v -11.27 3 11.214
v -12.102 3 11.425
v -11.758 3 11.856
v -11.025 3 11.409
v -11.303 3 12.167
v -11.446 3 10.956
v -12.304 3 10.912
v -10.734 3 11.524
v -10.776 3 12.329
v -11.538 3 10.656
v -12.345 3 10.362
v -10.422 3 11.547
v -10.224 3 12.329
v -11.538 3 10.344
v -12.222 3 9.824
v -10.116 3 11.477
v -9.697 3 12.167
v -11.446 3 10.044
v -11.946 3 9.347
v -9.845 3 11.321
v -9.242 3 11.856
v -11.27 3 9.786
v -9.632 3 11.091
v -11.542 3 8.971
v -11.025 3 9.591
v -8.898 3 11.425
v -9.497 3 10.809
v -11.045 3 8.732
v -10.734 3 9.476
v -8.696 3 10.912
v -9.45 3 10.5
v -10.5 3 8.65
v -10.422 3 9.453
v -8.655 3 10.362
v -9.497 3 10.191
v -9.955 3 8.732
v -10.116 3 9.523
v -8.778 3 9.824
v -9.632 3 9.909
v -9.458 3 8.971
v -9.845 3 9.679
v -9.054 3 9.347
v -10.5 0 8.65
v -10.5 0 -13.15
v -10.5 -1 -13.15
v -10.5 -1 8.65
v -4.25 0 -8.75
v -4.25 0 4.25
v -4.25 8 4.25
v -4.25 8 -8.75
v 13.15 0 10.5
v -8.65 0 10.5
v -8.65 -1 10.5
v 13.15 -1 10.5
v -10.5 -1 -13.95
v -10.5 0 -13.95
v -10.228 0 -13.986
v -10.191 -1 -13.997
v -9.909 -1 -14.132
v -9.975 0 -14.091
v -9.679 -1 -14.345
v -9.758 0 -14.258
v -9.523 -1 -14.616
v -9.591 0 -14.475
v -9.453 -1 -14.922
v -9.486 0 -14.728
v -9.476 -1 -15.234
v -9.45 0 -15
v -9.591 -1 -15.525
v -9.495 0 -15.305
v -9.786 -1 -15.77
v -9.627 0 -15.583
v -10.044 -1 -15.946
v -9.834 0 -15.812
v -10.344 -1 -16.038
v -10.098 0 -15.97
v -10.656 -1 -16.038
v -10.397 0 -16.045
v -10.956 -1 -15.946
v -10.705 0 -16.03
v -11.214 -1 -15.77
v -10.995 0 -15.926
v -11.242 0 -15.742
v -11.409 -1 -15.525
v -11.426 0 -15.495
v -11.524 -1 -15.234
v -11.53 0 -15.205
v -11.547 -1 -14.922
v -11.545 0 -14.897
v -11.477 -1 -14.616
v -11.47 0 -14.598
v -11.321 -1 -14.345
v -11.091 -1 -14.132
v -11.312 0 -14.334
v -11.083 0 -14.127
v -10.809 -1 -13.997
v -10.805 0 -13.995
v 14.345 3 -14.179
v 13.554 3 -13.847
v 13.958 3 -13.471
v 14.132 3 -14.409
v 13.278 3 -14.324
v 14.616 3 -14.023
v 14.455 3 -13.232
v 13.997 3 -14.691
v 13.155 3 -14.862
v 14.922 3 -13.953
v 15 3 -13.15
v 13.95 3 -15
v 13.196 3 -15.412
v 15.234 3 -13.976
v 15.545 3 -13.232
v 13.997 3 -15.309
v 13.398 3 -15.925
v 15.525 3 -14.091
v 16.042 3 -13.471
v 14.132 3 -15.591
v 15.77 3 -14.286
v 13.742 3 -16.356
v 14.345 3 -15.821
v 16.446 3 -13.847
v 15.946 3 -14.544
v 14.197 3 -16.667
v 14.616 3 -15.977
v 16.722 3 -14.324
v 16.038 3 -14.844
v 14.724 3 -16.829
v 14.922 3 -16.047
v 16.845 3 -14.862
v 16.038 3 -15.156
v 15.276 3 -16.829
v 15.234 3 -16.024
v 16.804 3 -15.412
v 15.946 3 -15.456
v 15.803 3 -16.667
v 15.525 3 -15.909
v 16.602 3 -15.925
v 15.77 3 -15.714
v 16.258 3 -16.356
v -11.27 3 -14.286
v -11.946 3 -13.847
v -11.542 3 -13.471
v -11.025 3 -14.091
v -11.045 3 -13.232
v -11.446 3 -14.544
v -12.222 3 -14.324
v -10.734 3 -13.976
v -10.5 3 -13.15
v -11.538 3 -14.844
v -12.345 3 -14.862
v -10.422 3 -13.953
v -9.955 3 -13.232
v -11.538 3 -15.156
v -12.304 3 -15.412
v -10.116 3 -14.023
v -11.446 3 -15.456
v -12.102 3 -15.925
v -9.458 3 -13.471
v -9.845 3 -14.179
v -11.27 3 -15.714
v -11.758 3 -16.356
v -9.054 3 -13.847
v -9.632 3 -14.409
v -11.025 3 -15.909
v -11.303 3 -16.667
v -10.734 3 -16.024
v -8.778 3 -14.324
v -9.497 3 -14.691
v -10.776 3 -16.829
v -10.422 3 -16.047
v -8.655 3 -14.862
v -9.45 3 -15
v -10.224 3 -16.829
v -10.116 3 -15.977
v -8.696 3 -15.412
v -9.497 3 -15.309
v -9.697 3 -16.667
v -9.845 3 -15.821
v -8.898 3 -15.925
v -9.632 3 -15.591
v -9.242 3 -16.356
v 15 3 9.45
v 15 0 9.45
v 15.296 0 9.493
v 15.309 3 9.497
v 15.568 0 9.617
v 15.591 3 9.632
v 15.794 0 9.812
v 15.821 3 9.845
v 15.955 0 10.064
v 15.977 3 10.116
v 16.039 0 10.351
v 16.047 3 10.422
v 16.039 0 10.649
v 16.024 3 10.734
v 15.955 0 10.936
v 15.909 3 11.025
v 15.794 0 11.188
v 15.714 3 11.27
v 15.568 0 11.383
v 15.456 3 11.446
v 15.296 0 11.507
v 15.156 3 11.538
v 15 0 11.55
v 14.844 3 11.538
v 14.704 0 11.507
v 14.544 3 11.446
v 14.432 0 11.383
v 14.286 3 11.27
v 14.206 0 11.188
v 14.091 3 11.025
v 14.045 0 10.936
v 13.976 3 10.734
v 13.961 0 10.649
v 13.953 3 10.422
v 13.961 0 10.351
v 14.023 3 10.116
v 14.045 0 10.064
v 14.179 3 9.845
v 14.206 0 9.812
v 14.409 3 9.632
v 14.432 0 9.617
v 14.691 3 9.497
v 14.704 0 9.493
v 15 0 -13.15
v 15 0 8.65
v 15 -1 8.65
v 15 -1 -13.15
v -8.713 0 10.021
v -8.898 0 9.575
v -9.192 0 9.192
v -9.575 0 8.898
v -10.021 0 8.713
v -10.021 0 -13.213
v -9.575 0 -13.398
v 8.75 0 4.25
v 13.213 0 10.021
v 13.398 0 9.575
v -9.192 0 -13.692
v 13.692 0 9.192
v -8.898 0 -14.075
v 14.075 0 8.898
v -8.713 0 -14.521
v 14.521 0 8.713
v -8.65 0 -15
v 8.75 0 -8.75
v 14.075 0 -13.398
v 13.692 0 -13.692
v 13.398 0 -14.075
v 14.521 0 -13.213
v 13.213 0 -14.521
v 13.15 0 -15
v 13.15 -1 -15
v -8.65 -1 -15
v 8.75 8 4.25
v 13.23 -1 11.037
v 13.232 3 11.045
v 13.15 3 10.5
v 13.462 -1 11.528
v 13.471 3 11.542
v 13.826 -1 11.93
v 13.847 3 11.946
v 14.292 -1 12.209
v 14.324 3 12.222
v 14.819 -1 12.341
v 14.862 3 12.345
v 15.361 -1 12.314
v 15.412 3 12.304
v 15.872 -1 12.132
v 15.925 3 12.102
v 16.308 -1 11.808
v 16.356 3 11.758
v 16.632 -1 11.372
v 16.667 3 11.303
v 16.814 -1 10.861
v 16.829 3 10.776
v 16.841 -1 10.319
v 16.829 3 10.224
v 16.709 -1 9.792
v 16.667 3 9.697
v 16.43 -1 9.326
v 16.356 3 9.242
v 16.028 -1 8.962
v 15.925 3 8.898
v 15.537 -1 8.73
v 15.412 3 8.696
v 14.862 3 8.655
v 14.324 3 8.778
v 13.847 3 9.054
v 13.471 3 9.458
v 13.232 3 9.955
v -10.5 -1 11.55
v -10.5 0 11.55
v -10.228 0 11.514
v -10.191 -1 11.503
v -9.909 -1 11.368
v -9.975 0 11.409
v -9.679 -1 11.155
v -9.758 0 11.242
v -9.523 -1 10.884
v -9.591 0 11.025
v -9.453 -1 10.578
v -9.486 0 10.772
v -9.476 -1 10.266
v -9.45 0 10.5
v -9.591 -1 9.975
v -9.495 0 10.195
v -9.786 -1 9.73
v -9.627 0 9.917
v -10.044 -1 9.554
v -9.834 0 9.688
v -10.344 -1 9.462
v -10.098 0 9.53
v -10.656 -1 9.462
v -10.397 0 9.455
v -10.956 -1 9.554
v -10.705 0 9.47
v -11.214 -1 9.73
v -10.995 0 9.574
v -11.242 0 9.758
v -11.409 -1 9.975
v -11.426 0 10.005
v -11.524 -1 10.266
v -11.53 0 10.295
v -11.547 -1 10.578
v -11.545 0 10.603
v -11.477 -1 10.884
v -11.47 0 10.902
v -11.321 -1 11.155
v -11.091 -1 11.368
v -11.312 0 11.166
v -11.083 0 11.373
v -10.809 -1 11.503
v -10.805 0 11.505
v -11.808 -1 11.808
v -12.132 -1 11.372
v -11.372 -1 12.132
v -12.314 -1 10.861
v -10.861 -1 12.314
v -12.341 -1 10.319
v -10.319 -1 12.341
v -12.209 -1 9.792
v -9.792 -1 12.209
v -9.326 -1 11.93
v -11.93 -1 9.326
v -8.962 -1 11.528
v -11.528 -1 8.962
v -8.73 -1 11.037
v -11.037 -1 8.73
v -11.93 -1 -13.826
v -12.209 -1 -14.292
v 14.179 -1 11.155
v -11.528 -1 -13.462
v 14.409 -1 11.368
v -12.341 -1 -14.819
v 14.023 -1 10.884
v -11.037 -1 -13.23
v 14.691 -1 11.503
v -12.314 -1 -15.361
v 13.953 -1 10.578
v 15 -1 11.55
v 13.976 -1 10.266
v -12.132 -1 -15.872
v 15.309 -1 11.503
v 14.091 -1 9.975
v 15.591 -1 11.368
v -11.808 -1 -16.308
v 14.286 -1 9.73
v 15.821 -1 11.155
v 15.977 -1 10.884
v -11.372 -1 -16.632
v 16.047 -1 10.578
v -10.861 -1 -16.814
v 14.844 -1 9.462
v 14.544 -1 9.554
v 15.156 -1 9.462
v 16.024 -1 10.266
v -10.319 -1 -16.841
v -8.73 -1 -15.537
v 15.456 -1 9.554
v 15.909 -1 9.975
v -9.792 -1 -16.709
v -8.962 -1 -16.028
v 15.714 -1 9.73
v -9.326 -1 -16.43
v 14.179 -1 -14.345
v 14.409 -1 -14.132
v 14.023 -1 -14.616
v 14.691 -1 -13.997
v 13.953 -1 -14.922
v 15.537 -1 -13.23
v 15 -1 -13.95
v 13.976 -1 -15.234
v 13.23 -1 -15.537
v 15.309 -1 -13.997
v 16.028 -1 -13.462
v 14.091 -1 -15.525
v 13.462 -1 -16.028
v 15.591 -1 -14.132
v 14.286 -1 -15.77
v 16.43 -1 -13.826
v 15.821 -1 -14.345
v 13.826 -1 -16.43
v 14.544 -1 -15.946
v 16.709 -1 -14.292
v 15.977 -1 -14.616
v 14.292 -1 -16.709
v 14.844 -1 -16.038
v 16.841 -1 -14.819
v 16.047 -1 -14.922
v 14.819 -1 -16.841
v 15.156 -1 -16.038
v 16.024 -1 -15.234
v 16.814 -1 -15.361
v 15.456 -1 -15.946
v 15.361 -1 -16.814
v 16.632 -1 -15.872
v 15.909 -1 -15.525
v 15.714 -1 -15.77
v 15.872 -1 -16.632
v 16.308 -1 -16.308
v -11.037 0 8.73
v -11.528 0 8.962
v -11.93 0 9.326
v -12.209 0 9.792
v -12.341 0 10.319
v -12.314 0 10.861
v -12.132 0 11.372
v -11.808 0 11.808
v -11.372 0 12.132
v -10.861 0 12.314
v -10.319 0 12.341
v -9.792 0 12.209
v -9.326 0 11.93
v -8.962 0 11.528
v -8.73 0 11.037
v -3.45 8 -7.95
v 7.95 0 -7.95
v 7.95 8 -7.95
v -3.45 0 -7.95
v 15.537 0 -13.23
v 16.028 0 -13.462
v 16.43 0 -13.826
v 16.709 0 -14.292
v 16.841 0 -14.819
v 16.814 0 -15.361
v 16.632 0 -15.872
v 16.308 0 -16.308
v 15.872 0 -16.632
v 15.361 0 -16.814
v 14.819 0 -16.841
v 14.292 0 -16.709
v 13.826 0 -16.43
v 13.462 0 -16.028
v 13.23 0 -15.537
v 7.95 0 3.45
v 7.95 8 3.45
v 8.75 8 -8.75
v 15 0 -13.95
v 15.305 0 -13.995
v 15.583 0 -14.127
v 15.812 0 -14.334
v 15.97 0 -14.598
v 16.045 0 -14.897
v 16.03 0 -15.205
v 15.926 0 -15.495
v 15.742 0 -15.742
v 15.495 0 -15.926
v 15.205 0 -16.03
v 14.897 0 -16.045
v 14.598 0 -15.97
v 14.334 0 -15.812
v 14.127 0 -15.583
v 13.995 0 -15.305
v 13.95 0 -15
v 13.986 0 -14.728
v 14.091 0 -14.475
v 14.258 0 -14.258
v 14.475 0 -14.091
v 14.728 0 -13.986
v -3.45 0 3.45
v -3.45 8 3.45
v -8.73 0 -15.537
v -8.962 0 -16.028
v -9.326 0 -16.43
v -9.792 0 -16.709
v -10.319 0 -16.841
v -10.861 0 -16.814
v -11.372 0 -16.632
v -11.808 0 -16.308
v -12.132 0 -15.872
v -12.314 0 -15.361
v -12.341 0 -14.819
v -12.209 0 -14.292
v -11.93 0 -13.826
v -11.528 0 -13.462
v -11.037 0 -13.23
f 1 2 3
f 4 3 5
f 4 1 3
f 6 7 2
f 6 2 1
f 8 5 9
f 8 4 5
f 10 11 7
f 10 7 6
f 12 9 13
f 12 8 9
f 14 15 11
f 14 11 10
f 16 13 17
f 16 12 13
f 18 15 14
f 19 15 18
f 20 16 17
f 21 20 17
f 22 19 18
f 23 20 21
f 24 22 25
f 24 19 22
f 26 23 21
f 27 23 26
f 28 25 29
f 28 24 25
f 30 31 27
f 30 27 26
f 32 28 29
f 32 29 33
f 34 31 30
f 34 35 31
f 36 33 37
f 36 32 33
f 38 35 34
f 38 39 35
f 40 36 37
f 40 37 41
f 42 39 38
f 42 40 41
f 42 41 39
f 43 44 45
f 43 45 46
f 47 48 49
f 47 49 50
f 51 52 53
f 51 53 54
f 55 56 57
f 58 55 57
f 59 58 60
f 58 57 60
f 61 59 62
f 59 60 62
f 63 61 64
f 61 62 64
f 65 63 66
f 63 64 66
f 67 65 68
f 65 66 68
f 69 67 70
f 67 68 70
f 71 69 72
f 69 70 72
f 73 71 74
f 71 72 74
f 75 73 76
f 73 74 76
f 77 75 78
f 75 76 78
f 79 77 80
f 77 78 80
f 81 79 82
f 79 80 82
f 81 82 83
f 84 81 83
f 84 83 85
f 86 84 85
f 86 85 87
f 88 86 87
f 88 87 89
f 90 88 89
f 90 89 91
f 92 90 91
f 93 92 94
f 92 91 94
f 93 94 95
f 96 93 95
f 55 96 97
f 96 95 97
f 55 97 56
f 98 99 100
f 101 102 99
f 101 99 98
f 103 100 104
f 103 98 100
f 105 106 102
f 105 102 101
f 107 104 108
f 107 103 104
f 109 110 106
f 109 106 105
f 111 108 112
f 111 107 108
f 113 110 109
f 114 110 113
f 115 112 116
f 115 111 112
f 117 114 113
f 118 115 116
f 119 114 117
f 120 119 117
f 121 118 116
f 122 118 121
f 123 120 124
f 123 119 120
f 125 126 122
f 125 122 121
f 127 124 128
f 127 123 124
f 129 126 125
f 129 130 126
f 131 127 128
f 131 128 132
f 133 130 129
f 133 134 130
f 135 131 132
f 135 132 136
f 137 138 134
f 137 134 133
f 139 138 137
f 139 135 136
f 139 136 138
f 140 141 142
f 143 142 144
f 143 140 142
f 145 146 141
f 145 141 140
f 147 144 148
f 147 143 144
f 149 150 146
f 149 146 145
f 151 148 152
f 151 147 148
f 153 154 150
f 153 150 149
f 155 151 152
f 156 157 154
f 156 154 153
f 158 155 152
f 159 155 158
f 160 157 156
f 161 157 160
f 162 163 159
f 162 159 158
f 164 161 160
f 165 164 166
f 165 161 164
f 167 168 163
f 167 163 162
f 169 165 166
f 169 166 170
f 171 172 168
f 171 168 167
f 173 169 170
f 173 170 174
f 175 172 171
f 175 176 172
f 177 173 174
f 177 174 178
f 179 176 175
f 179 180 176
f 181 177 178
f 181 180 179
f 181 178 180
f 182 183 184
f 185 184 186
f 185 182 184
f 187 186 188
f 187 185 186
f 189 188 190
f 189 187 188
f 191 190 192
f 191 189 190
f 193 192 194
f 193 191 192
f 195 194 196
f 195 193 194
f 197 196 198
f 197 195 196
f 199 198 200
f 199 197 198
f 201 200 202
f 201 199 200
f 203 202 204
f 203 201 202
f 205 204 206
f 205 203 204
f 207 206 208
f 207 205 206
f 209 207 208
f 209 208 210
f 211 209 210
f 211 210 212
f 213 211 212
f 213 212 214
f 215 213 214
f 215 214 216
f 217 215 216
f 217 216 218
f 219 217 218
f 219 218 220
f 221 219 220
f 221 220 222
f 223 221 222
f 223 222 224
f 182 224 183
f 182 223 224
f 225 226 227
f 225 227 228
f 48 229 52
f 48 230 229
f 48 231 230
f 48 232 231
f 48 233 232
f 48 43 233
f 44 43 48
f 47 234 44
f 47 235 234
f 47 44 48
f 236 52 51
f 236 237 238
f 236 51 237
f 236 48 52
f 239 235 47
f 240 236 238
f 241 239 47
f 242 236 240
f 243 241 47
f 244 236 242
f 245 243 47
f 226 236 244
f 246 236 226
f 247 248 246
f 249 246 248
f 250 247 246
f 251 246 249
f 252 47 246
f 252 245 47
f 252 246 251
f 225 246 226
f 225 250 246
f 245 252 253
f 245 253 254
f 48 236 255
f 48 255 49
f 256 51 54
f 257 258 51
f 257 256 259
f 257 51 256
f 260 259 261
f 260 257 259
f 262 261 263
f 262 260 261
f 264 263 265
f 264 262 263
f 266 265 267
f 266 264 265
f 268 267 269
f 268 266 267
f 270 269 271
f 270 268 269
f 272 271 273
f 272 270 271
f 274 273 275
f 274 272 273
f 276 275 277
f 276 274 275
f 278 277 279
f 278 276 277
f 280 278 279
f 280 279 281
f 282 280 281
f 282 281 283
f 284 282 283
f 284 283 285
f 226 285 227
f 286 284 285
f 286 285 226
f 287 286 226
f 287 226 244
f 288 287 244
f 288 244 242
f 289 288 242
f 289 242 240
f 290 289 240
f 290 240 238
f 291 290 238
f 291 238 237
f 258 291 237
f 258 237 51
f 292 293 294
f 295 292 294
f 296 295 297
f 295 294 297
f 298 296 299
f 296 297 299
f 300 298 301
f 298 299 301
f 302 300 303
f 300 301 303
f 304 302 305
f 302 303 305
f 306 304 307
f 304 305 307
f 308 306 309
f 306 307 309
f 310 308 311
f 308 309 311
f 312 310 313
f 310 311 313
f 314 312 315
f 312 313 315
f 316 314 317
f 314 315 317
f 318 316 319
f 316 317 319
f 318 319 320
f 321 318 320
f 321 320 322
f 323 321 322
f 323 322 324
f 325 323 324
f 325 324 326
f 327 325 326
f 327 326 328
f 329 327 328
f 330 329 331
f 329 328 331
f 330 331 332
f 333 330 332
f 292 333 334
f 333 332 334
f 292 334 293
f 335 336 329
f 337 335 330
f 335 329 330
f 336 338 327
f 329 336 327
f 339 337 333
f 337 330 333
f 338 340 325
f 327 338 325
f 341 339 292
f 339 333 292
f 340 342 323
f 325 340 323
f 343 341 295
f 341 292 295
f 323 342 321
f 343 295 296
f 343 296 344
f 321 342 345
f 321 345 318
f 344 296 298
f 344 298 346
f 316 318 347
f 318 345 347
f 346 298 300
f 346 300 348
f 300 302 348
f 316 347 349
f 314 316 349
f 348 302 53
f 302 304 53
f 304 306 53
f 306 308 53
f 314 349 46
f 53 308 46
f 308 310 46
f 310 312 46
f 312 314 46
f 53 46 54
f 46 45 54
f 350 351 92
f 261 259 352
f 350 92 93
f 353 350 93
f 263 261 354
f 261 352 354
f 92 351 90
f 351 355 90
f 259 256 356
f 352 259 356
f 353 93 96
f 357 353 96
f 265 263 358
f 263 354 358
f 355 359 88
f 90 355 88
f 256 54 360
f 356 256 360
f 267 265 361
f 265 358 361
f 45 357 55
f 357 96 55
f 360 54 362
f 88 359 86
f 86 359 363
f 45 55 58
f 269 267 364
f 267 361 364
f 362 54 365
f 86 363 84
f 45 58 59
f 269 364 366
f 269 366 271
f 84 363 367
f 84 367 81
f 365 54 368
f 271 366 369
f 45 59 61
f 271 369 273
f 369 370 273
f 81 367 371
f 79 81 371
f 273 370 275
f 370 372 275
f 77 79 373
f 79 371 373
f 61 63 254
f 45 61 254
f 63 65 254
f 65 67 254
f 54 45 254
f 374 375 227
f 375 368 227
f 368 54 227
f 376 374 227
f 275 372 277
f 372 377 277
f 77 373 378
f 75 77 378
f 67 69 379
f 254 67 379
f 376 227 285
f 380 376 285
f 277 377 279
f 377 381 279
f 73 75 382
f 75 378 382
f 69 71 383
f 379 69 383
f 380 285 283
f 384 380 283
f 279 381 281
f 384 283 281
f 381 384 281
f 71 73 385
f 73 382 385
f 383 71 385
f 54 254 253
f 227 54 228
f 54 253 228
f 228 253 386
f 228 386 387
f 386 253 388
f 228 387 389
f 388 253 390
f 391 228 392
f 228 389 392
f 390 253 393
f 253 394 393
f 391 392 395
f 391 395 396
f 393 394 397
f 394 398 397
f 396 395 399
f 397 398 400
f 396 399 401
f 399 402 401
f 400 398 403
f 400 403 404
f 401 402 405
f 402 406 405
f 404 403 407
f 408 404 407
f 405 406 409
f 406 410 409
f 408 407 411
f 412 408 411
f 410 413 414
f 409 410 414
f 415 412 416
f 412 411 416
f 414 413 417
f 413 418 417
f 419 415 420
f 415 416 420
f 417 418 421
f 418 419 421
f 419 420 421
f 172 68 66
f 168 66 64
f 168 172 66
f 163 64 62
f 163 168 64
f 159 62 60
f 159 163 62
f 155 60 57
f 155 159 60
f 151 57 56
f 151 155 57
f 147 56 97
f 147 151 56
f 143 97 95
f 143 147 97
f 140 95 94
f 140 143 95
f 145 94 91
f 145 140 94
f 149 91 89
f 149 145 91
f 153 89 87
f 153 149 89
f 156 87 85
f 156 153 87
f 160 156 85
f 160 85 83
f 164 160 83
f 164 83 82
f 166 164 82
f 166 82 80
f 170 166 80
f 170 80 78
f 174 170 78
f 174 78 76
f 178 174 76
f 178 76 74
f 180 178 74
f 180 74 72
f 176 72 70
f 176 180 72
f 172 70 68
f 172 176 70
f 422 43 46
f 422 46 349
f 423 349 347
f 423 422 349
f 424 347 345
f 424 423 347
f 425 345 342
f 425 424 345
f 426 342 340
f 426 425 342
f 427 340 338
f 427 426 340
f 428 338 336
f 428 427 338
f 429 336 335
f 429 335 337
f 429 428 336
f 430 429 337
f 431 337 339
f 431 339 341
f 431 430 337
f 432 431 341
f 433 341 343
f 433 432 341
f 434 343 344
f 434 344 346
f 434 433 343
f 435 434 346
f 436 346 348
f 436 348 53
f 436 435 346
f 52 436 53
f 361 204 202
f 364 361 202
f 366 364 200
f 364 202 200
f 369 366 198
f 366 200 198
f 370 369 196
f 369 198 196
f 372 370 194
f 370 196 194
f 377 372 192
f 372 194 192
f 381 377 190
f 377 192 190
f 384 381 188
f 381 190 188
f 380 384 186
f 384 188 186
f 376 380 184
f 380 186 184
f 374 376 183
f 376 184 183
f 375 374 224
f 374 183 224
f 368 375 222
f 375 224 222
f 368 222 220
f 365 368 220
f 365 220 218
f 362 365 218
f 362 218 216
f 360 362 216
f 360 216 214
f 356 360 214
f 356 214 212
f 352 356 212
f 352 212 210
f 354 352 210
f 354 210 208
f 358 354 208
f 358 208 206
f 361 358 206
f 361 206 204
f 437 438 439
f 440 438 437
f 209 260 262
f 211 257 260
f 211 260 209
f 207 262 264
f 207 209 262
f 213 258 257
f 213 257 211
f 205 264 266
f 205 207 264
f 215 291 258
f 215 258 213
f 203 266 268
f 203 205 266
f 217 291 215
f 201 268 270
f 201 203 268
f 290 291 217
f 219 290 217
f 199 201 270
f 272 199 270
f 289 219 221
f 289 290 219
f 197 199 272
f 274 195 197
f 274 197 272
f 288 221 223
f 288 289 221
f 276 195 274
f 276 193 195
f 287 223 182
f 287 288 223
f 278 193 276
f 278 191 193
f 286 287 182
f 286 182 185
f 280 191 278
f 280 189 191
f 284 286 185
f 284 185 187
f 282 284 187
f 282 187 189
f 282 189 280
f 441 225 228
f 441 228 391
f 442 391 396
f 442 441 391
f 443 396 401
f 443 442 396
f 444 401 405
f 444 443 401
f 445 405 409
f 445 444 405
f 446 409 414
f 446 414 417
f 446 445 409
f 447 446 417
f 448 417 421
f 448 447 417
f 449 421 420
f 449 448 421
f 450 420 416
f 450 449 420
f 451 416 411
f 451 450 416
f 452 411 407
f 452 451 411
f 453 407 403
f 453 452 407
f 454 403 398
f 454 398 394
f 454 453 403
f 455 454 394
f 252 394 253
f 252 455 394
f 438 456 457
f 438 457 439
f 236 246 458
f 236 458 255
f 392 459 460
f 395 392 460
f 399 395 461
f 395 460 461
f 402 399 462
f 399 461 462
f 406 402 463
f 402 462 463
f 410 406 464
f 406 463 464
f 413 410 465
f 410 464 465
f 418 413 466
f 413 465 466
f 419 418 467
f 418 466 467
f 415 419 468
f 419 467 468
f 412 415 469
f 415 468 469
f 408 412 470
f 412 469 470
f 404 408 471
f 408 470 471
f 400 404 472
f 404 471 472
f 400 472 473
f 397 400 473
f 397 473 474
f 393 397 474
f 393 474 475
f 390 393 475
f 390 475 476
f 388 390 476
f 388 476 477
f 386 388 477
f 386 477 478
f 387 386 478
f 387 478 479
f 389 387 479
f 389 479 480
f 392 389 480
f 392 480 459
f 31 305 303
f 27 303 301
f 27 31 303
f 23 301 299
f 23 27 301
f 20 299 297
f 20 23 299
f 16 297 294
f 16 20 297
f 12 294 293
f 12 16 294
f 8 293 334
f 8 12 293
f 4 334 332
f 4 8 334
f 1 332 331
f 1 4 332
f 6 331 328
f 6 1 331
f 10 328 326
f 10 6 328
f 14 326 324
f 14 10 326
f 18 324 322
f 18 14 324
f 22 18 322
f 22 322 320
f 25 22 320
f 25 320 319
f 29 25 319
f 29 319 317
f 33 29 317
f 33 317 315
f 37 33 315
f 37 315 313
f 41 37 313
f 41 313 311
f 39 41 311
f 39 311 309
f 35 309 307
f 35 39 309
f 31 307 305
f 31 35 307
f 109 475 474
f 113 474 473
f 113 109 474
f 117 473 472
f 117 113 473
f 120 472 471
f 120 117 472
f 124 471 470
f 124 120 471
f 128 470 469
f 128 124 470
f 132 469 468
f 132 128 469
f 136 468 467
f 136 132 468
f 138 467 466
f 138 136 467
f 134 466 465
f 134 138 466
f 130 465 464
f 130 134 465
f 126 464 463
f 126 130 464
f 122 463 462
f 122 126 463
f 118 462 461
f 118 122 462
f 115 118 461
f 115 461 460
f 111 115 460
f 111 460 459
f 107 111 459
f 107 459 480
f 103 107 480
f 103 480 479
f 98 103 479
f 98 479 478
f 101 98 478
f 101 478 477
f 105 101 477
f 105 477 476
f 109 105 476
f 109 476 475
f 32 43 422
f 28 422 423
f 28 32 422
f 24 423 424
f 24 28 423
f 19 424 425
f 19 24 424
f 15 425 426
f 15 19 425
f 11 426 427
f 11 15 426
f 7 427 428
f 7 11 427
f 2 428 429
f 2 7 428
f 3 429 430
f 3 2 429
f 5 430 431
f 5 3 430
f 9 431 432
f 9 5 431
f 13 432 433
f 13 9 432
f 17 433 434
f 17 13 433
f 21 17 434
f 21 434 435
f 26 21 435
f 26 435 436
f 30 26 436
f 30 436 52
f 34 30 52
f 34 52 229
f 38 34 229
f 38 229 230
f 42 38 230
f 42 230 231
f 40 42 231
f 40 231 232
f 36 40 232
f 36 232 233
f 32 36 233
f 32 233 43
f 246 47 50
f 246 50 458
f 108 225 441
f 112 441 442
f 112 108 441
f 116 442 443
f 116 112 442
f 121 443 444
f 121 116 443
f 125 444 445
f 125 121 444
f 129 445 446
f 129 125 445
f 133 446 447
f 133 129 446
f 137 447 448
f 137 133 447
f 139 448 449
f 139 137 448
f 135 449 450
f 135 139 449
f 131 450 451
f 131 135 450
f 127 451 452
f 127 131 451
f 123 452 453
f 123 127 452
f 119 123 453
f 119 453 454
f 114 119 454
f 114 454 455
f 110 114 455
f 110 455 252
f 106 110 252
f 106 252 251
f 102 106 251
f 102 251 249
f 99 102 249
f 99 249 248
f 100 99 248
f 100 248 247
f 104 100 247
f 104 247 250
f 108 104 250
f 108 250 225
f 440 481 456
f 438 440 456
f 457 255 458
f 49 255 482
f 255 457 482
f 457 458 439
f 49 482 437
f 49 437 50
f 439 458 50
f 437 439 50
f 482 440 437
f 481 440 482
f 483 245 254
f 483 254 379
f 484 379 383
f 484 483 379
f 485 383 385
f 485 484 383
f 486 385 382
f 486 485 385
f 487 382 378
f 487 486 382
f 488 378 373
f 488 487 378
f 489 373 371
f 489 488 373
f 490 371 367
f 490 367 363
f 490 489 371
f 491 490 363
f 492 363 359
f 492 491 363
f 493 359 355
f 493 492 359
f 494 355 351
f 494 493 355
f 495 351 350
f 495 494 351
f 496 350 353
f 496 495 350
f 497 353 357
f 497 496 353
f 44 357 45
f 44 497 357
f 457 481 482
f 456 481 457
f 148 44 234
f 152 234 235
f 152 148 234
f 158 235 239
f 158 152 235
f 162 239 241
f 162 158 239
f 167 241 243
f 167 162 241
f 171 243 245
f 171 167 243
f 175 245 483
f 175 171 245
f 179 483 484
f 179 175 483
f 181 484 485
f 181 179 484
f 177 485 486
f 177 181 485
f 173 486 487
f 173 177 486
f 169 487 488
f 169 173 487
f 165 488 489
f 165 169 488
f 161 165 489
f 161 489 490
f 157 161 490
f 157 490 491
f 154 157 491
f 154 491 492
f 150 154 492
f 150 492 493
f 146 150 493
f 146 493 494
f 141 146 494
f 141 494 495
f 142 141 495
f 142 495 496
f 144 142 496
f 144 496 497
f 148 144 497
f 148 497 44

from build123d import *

# Parameters (mm, degrees)
SKETCH1_R           = 1.05
BOSS_EXTRUDE2_DEPTH = 1
BOSS_EXTRUDE4_START = 3
BOSS_EXTRUDE4_DEPTH = 3
SKETCH2_W           = 13
SKETCH2_H           = 13
SKETCH2_W_2         = 11.4
SKETCH2_H_2         = 11.4
BOSS_EXTRUDE5_DEPTH = 8


with BuildPart() as part:
    # Sketch1 → Boss-Extrude2 (new body)
    with BuildSketch(Plane(origin=(0, 0, 0), x_dir=(1, 0, 0), z_dir=(0, 1, 0))):
        with BuildLine():
            ThreePointArc((-10.5, -8.65), (-11.808147545, -11.808147545), (-8.65, -10.5))
            Line((-8.65, -10.5), (13.15, -10.5))
            ThreePointArc((13.15, -10.5), (16.308147545, -11.808147545), (15, -8.65))
            Line((15, -8.65), (15, 13.15))
            ThreePointArc((15, 13.15), (16.308147545, 16.308147545), (13.15, 15))
            Line((13.15, 15), (-8.65, 15))
            ThreePointArc((-8.65, 15), (-11.808147545, 16.308147545), (-10.5, 13.15))
            Line((-10.5, 13.15), (-10.5, -8.65))
        make_face()
        with Locations((-10.5, -10.5)):
            Circle(SKETCH1_R, mode=Mode.SUBTRACT)
        with Locations((-10.5, 15)):
            Circle(SKETCH1_R, mode=Mode.SUBTRACT)
        with Locations((15, 15)):
            Circle(SKETCH1_R, mode=Mode.SUBTRACT)
        with Locations((15, -10.5)):
            Circle(SKETCH1_R, mode=Mode.SUBTRACT)
    extrude(amount=-BOSS_EXTRUDE2_DEPTH)

    # Sketch1<5> → Boss-Extrude4 (add)
    with BuildSketch(Plane(origin=(0, 0, 0), x_dir=(1, 0, 0), z_dir=(0, 1, 0)).offset(BOSS_EXTRUDE4_START)):
        with BuildLine():
            ThreePointArc((15, -8.65), (13.691852455, -9.191852455), (13.15, -10.5))
            Line((13.15, -10.5), (13.95, -10.5))
            ThreePointArc((13.95, -10.5), (14.25753788, -9.75753788), (15, -9.45))
            Line((15, -9.45), (15, -8.65))
        make_face()
        with BuildLine():
            Line((13.95, -10.5), (13.15, -10.5))
            ThreePointArc((13.15, -10.5), (15, -12.35), (16.85, -10.5))
            ThreePointArc((16.85, -10.5), (16.308147545, -9.191852455), (15, -8.65))
            Line((15, -8.65), (15, -9.45))
            ThreePointArc((15, -9.45), (15.74246212, -9.75753788), (16.05, -10.5))
            ThreePointArc((16.05, -10.5), (15, -11.55), (13.95, -10.5))
        make_face()
        with BuildLine():
            ThreePointArc((15, -8.65), (13.691852455, -9.191852455), (13.15, -10.5))
            Line((13.15, -10.5), (13.95, -10.5))
            ThreePointArc((13.95, -10.5), (14.25753788, -9.75753788), (15, -9.45))
            Line((15, -9.45), (15, -8.65))
        make_face()
        with BuildLine():
            Line((13.95, -10.5), (13.15, -10.5))
            ThreePointArc((13.15, -10.5), (15, -12.35), (16.85, -10.5))
            ThreePointArc((16.85, -10.5), (16.308147545, -9.191852455), (15, -8.65))
            Line((15, -8.65), (15, -9.45))
            ThreePointArc((15, -9.45), (15.74246212, -9.75753788), (16.05, -10.5))
            ThreePointArc((16.05, -10.5), (15, -11.55), (13.95, -10.5))
        make_face()
        with BuildLine():
            ThreePointArc((13.15, 15), (13.691852455, 13.691852455), (15, 13.15))
            Line((15, 13.15), (15, 13.95))
            ThreePointArc((15, 13.95), (14.25753788, 14.25753788), (13.95, 15))
            Line((13.95, 15), (13.15, 15))
        make_face()
        with BuildLine():
            Line((15, 13.95), (15, 13.15))
            ThreePointArc((15, 13.15), (16.308147545, 13.691852455), (16.85, 15))
            ThreePointArc((16.85, 15), (15, 16.85), (13.15, 15))
            Line((13.15, 15), (13.95, 15))
            ThreePointArc((13.95, 15), (15, 16.05), (16.05, 15))
            ThreePointArc((16.05, 15), (15.74246212, 14.25753788), (15, 13.95))
        make_face()
        with BuildLine():
            ThreePointArc((13.15, 15), (13.691852455, 13.691852455), (15, 13.15))
            Line((15, 13.15), (15, 13.95))
            ThreePointArc((15, 13.95), (14.25753788, 14.25753788), (13.95, 15))
            Line((13.95, 15), (13.15, 15))
        make_face()
        with BuildLine():
            Line((15, 13.95), (15, 13.15))
            ThreePointArc((15, 13.15), (16.308147545, 13.691852455), (16.85, 15))
            ThreePointArc((16.85, 15), (15, 16.85), (13.15, 15))
            Line((13.15, 15), (13.95, 15))
            ThreePointArc((13.95, 15), (15, 16.05), (16.05, 15))
            ThreePointArc((16.05, 15), (15.74246212, 14.25753788), (15, 13.95))
        make_face()
        with BuildLine():
            ThreePointArc((-10.5, -9.45), (-9.75753788, -9.75753788), (-9.45, -10.5))
            Line((-9.45, -10.5), (-8.65, -10.5))
            ThreePointArc((-8.65, -10.5), (-9.191852455, -9.191852455), (-10.5, -8.65))
            Line((-10.5, -8.65), (-10.5, -9.45))
        make_face()
        with BuildLine():
            Line((-8.65, -10.5), (-9.45, -10.5))
            ThreePointArc((-9.45, -10.5), (-11.24246212, -11.24246212), (-10.5, -9.45))
            Line((-10.5, -9.45), (-10.5, -8.65))
            ThreePointArc((-10.5, -8.65), (-11.808147545, -11.808147545), (-8.65, -10.5))
        make_face()
        with BuildLine():
            ThreePointArc((-10.5, -9.45), (-9.75753788, -9.75753788), (-9.45, -10.5))
            Line((-9.45, -10.5), (-8.65, -10.5))
            ThreePointArc((-8.65, -10.5), (-9.191852455, -9.191852455), (-10.5, -8.65))
            Line((-10.5, -8.65), (-10.5, -9.45))
        make_face()
        with BuildLine():
            Line((-8.65, -10.5), (-9.45, -10.5))
            ThreePointArc((-9.45, -10.5), (-11.24246212, -11.24246212), (-10.5, -9.45))
            Line((-10.5, -9.45), (-10.5, -8.65))
            ThreePointArc((-10.5, -8.65), (-11.808147545, -11.808147545), (-8.65, -10.5))
        make_face()
        with BuildLine():
            ThreePointArc((-8.65, 15), (-11.808147545, 16.308147545), (-10.5, 13.15))
            Line((-10.5, 13.15), (-10.5, 13.95))
            ThreePointArc((-10.5, 13.95), (-11.24246212, 15.74246212), (-9.45, 15))
            Line((-9.45, 15), (-8.65, 15))
        make_face()
        with BuildLine():
            Line((-10.5, 13.95), (-10.5, 13.15))
            ThreePointArc((-10.5, 13.15), (-9.191852455, 13.691852455), (-8.65, 15))
            Line((-8.65, 15), (-9.45, 15))
            ThreePointArc((-9.45, 15), (-9.75753788, 14.25753788), (-10.5, 13.95))
        make_face()
        with BuildLine():
            ThreePointArc((-8.65, 15), (-11.808147545, 16.308147545), (-10.5, 13.15))
            Line((-10.5, 13.15), (-10.5, 13.95))
            ThreePointArc((-10.5, 13.95), (-11.24246212, 15.74246212), (-9.45, 15))
            Line((-9.45, 15), (-8.65, 15))
        make_face()
        with BuildLine():
            Line((-10.5, 13.95), (-10.5, 13.15))
            ThreePointArc((-10.5, 13.15), (-9.191852455, 13.691852455), (-8.65, 15))
            Line((-8.65, 15), (-9.45, 15))
            ThreePointArc((-9.45, 15), (-9.75753788, 14.25753788), (-10.5, 13.95))
        make_face()
    extrude(amount=-BOSS_EXTRUDE4_DEPTH)

    # Sketch2 → Boss-Extrude5 (add)
    with BuildSketch(Plane(origin=(0, 0, 0), x_dir=(1, 0, 0), z_dir=(0, 1, 0))):
        with Locations((2.25, 2.25)):
            Rectangle(SKETCH2_W, SKETCH2_H)
        with Locations((2.25, 2.25)):
            Rectangle(SKETCH2_W_2, SKETCH2_H_2, mode=Mode.SUBTRACT)
    extrude(amount=BOSS_EXTRUDE5_DEPTH)


solid = part.part
